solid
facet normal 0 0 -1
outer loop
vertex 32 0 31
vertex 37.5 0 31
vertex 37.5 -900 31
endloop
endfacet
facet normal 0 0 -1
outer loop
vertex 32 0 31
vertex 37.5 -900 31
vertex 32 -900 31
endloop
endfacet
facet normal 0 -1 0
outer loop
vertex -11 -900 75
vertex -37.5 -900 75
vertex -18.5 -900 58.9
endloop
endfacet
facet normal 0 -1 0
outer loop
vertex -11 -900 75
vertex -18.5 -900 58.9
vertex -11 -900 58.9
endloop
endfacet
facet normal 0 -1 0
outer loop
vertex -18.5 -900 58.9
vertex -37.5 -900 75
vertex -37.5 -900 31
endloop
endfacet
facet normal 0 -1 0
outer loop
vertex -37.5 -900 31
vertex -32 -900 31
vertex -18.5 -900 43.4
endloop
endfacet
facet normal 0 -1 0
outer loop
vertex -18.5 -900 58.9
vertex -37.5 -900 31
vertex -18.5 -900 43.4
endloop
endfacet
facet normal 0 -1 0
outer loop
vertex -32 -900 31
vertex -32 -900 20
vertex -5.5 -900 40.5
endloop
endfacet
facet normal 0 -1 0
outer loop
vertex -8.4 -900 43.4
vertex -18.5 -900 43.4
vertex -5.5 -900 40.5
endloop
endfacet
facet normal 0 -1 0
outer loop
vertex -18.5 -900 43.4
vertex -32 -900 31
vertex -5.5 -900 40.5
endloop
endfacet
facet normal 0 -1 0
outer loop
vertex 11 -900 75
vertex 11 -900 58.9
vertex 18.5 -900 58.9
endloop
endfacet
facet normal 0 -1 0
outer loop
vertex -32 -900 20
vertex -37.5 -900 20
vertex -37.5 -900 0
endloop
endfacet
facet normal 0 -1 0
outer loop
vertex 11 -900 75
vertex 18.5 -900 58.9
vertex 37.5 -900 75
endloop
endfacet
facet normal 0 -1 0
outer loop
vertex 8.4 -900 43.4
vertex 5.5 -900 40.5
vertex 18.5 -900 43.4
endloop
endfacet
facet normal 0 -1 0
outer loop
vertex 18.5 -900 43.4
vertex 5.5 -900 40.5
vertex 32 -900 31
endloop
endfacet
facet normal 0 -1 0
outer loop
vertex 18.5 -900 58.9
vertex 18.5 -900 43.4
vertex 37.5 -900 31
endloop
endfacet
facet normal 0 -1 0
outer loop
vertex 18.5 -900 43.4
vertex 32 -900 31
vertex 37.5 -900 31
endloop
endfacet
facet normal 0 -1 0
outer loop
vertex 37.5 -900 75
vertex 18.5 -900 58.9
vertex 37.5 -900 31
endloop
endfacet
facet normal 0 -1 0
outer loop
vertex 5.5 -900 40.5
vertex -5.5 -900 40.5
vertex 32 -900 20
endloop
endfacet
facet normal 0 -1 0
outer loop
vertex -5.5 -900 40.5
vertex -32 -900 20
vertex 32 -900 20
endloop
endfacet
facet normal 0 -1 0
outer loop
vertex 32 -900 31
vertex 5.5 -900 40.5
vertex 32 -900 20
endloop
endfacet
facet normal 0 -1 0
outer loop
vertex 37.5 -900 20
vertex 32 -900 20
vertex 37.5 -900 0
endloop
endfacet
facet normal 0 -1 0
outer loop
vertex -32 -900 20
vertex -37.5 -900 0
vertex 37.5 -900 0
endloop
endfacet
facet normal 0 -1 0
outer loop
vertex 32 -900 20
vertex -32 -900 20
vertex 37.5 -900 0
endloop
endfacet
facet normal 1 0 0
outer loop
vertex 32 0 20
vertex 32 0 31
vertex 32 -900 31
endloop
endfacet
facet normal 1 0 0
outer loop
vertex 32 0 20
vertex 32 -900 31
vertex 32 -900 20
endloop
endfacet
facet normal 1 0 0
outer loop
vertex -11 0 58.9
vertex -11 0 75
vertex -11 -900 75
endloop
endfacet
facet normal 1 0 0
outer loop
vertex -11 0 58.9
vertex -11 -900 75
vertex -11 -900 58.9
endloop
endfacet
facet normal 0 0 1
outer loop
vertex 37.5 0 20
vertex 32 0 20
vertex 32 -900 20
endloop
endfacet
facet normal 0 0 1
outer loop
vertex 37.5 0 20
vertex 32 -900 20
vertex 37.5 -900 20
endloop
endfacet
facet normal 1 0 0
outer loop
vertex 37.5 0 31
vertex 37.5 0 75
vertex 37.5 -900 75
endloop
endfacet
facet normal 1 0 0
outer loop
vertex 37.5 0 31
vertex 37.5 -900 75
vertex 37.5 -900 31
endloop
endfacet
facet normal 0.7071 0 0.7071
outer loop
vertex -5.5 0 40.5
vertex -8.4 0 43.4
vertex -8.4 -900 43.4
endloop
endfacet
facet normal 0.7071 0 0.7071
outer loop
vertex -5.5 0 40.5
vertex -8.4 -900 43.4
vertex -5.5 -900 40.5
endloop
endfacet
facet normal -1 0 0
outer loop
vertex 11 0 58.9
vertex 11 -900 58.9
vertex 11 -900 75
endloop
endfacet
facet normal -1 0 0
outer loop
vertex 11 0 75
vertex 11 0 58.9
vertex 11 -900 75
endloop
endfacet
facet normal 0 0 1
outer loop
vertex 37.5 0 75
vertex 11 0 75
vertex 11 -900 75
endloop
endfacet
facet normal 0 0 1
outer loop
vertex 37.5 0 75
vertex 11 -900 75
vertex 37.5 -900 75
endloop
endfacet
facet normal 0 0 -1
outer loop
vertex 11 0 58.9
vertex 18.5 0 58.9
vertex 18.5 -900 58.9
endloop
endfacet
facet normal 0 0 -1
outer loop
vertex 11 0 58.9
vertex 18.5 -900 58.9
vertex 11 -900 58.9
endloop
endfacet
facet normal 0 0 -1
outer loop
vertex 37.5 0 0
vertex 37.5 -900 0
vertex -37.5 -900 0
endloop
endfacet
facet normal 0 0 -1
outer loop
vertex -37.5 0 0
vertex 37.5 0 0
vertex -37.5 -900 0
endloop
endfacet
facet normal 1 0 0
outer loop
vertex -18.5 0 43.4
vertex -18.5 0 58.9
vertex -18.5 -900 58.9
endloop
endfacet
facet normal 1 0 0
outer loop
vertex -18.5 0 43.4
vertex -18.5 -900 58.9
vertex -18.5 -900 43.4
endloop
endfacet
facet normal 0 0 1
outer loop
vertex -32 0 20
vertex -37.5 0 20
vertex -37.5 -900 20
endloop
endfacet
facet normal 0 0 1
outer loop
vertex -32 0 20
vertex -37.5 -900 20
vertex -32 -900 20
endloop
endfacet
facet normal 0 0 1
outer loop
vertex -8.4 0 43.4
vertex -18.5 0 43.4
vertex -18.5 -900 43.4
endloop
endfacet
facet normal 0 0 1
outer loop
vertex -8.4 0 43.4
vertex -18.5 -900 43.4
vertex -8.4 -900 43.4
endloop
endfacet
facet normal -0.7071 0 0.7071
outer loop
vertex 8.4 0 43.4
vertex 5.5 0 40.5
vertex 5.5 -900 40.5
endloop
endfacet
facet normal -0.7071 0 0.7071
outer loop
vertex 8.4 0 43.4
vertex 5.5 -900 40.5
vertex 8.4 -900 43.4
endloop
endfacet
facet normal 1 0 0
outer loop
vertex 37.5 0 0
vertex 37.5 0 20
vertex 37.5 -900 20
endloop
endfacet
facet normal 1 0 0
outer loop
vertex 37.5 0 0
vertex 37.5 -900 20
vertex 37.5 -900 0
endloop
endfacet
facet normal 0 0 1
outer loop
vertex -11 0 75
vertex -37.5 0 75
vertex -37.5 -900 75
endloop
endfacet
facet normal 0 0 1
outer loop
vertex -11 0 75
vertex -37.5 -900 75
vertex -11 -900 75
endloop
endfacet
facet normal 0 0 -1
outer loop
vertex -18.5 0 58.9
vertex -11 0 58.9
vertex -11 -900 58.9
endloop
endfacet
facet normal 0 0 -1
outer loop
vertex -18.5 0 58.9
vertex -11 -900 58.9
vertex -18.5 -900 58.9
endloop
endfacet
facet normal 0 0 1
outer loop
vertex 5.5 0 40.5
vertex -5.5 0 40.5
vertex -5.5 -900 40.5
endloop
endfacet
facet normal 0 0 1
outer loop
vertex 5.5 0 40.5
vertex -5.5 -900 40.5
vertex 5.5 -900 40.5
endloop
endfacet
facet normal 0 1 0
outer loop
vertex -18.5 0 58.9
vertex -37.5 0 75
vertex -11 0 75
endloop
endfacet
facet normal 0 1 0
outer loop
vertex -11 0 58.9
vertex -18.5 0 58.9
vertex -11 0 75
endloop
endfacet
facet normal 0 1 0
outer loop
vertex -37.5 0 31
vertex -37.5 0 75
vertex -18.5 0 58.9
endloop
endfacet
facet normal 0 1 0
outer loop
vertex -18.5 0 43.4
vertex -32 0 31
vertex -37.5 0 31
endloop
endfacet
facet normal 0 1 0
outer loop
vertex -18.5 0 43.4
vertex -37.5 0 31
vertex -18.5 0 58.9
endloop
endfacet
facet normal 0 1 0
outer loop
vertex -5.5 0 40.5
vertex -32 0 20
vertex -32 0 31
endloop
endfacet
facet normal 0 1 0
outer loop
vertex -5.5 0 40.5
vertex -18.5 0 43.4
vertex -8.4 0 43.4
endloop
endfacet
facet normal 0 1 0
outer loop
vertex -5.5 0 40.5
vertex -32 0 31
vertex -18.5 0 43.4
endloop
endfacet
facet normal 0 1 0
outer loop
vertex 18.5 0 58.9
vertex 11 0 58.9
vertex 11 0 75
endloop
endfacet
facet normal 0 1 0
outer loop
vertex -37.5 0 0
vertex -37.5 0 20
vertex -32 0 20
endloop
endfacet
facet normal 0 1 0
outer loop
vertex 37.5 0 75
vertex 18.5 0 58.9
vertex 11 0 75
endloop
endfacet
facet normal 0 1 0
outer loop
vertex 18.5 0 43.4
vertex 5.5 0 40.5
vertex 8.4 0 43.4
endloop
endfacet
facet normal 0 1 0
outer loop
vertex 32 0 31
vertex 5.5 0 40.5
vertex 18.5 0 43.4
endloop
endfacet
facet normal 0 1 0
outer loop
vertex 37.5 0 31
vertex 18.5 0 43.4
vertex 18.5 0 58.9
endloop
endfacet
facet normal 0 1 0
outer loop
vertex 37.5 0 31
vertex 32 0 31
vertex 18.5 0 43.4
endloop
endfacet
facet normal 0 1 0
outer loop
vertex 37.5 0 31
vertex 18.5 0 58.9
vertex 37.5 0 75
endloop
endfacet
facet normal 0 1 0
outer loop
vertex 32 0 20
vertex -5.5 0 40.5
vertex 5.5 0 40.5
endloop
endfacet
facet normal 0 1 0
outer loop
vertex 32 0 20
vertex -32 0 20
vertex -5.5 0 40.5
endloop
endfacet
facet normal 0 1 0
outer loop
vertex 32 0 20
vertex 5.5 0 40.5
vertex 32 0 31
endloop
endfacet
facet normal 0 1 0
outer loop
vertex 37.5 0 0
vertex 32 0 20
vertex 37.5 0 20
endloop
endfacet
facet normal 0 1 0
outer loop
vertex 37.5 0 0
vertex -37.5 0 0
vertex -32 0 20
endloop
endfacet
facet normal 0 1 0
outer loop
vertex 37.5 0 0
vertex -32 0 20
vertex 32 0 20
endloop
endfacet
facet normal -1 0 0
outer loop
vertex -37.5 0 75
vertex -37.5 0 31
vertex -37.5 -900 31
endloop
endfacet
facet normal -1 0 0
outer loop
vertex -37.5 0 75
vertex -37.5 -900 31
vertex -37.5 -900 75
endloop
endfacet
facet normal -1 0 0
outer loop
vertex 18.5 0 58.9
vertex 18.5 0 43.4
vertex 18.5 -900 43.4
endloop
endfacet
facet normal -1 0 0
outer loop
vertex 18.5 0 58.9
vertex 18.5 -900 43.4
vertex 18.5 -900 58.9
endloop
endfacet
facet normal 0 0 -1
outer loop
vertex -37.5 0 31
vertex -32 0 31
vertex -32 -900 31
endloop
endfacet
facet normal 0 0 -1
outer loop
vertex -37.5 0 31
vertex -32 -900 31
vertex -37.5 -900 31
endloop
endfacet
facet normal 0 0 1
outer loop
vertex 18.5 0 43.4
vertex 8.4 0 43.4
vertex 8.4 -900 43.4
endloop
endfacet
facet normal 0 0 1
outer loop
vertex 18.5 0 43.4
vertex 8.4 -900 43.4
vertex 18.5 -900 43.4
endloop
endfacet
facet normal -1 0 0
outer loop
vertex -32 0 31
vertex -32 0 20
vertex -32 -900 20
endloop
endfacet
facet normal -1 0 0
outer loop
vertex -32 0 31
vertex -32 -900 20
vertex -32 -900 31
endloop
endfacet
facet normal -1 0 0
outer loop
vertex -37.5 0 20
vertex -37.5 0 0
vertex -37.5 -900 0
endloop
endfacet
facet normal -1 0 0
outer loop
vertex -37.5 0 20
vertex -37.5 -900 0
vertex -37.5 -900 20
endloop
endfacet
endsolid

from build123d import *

# Parameters (mm, degrees)
BOSS_EXTRUDE1_DEPTH = 900


with BuildPart() as part:
    # Sketch1 → Boss-Extrude1 (new body)
    with BuildSketch(Plane(origin=(0, 0, 0), x_dir=(1, 0, 0), z_dir=(0, 1, 0))):
        Polygon((37.5, 0), (-37.5, 0), (-37.5, -20), (-32, -20), (-32, -31), (-37.5, -31), (-37.5, -75), (-11, -75), (-11, -58.9), (-18.5, -58.9), (-18.5, -43.4), (-8.4, -43.4), (-5.5, -40.5), (5.5, -40.5), (8.4, -43.4), (18.5, -43.4), (18.5, -58.9), (11, -58.9), (11, -75), (37.5, -75), (37.5, -31), (32, -31), (32, -20), (37.5, -20), align=None)
    extrude(amount=-BOSS_EXTRUDE1_DEPTH)


solid = part.part
